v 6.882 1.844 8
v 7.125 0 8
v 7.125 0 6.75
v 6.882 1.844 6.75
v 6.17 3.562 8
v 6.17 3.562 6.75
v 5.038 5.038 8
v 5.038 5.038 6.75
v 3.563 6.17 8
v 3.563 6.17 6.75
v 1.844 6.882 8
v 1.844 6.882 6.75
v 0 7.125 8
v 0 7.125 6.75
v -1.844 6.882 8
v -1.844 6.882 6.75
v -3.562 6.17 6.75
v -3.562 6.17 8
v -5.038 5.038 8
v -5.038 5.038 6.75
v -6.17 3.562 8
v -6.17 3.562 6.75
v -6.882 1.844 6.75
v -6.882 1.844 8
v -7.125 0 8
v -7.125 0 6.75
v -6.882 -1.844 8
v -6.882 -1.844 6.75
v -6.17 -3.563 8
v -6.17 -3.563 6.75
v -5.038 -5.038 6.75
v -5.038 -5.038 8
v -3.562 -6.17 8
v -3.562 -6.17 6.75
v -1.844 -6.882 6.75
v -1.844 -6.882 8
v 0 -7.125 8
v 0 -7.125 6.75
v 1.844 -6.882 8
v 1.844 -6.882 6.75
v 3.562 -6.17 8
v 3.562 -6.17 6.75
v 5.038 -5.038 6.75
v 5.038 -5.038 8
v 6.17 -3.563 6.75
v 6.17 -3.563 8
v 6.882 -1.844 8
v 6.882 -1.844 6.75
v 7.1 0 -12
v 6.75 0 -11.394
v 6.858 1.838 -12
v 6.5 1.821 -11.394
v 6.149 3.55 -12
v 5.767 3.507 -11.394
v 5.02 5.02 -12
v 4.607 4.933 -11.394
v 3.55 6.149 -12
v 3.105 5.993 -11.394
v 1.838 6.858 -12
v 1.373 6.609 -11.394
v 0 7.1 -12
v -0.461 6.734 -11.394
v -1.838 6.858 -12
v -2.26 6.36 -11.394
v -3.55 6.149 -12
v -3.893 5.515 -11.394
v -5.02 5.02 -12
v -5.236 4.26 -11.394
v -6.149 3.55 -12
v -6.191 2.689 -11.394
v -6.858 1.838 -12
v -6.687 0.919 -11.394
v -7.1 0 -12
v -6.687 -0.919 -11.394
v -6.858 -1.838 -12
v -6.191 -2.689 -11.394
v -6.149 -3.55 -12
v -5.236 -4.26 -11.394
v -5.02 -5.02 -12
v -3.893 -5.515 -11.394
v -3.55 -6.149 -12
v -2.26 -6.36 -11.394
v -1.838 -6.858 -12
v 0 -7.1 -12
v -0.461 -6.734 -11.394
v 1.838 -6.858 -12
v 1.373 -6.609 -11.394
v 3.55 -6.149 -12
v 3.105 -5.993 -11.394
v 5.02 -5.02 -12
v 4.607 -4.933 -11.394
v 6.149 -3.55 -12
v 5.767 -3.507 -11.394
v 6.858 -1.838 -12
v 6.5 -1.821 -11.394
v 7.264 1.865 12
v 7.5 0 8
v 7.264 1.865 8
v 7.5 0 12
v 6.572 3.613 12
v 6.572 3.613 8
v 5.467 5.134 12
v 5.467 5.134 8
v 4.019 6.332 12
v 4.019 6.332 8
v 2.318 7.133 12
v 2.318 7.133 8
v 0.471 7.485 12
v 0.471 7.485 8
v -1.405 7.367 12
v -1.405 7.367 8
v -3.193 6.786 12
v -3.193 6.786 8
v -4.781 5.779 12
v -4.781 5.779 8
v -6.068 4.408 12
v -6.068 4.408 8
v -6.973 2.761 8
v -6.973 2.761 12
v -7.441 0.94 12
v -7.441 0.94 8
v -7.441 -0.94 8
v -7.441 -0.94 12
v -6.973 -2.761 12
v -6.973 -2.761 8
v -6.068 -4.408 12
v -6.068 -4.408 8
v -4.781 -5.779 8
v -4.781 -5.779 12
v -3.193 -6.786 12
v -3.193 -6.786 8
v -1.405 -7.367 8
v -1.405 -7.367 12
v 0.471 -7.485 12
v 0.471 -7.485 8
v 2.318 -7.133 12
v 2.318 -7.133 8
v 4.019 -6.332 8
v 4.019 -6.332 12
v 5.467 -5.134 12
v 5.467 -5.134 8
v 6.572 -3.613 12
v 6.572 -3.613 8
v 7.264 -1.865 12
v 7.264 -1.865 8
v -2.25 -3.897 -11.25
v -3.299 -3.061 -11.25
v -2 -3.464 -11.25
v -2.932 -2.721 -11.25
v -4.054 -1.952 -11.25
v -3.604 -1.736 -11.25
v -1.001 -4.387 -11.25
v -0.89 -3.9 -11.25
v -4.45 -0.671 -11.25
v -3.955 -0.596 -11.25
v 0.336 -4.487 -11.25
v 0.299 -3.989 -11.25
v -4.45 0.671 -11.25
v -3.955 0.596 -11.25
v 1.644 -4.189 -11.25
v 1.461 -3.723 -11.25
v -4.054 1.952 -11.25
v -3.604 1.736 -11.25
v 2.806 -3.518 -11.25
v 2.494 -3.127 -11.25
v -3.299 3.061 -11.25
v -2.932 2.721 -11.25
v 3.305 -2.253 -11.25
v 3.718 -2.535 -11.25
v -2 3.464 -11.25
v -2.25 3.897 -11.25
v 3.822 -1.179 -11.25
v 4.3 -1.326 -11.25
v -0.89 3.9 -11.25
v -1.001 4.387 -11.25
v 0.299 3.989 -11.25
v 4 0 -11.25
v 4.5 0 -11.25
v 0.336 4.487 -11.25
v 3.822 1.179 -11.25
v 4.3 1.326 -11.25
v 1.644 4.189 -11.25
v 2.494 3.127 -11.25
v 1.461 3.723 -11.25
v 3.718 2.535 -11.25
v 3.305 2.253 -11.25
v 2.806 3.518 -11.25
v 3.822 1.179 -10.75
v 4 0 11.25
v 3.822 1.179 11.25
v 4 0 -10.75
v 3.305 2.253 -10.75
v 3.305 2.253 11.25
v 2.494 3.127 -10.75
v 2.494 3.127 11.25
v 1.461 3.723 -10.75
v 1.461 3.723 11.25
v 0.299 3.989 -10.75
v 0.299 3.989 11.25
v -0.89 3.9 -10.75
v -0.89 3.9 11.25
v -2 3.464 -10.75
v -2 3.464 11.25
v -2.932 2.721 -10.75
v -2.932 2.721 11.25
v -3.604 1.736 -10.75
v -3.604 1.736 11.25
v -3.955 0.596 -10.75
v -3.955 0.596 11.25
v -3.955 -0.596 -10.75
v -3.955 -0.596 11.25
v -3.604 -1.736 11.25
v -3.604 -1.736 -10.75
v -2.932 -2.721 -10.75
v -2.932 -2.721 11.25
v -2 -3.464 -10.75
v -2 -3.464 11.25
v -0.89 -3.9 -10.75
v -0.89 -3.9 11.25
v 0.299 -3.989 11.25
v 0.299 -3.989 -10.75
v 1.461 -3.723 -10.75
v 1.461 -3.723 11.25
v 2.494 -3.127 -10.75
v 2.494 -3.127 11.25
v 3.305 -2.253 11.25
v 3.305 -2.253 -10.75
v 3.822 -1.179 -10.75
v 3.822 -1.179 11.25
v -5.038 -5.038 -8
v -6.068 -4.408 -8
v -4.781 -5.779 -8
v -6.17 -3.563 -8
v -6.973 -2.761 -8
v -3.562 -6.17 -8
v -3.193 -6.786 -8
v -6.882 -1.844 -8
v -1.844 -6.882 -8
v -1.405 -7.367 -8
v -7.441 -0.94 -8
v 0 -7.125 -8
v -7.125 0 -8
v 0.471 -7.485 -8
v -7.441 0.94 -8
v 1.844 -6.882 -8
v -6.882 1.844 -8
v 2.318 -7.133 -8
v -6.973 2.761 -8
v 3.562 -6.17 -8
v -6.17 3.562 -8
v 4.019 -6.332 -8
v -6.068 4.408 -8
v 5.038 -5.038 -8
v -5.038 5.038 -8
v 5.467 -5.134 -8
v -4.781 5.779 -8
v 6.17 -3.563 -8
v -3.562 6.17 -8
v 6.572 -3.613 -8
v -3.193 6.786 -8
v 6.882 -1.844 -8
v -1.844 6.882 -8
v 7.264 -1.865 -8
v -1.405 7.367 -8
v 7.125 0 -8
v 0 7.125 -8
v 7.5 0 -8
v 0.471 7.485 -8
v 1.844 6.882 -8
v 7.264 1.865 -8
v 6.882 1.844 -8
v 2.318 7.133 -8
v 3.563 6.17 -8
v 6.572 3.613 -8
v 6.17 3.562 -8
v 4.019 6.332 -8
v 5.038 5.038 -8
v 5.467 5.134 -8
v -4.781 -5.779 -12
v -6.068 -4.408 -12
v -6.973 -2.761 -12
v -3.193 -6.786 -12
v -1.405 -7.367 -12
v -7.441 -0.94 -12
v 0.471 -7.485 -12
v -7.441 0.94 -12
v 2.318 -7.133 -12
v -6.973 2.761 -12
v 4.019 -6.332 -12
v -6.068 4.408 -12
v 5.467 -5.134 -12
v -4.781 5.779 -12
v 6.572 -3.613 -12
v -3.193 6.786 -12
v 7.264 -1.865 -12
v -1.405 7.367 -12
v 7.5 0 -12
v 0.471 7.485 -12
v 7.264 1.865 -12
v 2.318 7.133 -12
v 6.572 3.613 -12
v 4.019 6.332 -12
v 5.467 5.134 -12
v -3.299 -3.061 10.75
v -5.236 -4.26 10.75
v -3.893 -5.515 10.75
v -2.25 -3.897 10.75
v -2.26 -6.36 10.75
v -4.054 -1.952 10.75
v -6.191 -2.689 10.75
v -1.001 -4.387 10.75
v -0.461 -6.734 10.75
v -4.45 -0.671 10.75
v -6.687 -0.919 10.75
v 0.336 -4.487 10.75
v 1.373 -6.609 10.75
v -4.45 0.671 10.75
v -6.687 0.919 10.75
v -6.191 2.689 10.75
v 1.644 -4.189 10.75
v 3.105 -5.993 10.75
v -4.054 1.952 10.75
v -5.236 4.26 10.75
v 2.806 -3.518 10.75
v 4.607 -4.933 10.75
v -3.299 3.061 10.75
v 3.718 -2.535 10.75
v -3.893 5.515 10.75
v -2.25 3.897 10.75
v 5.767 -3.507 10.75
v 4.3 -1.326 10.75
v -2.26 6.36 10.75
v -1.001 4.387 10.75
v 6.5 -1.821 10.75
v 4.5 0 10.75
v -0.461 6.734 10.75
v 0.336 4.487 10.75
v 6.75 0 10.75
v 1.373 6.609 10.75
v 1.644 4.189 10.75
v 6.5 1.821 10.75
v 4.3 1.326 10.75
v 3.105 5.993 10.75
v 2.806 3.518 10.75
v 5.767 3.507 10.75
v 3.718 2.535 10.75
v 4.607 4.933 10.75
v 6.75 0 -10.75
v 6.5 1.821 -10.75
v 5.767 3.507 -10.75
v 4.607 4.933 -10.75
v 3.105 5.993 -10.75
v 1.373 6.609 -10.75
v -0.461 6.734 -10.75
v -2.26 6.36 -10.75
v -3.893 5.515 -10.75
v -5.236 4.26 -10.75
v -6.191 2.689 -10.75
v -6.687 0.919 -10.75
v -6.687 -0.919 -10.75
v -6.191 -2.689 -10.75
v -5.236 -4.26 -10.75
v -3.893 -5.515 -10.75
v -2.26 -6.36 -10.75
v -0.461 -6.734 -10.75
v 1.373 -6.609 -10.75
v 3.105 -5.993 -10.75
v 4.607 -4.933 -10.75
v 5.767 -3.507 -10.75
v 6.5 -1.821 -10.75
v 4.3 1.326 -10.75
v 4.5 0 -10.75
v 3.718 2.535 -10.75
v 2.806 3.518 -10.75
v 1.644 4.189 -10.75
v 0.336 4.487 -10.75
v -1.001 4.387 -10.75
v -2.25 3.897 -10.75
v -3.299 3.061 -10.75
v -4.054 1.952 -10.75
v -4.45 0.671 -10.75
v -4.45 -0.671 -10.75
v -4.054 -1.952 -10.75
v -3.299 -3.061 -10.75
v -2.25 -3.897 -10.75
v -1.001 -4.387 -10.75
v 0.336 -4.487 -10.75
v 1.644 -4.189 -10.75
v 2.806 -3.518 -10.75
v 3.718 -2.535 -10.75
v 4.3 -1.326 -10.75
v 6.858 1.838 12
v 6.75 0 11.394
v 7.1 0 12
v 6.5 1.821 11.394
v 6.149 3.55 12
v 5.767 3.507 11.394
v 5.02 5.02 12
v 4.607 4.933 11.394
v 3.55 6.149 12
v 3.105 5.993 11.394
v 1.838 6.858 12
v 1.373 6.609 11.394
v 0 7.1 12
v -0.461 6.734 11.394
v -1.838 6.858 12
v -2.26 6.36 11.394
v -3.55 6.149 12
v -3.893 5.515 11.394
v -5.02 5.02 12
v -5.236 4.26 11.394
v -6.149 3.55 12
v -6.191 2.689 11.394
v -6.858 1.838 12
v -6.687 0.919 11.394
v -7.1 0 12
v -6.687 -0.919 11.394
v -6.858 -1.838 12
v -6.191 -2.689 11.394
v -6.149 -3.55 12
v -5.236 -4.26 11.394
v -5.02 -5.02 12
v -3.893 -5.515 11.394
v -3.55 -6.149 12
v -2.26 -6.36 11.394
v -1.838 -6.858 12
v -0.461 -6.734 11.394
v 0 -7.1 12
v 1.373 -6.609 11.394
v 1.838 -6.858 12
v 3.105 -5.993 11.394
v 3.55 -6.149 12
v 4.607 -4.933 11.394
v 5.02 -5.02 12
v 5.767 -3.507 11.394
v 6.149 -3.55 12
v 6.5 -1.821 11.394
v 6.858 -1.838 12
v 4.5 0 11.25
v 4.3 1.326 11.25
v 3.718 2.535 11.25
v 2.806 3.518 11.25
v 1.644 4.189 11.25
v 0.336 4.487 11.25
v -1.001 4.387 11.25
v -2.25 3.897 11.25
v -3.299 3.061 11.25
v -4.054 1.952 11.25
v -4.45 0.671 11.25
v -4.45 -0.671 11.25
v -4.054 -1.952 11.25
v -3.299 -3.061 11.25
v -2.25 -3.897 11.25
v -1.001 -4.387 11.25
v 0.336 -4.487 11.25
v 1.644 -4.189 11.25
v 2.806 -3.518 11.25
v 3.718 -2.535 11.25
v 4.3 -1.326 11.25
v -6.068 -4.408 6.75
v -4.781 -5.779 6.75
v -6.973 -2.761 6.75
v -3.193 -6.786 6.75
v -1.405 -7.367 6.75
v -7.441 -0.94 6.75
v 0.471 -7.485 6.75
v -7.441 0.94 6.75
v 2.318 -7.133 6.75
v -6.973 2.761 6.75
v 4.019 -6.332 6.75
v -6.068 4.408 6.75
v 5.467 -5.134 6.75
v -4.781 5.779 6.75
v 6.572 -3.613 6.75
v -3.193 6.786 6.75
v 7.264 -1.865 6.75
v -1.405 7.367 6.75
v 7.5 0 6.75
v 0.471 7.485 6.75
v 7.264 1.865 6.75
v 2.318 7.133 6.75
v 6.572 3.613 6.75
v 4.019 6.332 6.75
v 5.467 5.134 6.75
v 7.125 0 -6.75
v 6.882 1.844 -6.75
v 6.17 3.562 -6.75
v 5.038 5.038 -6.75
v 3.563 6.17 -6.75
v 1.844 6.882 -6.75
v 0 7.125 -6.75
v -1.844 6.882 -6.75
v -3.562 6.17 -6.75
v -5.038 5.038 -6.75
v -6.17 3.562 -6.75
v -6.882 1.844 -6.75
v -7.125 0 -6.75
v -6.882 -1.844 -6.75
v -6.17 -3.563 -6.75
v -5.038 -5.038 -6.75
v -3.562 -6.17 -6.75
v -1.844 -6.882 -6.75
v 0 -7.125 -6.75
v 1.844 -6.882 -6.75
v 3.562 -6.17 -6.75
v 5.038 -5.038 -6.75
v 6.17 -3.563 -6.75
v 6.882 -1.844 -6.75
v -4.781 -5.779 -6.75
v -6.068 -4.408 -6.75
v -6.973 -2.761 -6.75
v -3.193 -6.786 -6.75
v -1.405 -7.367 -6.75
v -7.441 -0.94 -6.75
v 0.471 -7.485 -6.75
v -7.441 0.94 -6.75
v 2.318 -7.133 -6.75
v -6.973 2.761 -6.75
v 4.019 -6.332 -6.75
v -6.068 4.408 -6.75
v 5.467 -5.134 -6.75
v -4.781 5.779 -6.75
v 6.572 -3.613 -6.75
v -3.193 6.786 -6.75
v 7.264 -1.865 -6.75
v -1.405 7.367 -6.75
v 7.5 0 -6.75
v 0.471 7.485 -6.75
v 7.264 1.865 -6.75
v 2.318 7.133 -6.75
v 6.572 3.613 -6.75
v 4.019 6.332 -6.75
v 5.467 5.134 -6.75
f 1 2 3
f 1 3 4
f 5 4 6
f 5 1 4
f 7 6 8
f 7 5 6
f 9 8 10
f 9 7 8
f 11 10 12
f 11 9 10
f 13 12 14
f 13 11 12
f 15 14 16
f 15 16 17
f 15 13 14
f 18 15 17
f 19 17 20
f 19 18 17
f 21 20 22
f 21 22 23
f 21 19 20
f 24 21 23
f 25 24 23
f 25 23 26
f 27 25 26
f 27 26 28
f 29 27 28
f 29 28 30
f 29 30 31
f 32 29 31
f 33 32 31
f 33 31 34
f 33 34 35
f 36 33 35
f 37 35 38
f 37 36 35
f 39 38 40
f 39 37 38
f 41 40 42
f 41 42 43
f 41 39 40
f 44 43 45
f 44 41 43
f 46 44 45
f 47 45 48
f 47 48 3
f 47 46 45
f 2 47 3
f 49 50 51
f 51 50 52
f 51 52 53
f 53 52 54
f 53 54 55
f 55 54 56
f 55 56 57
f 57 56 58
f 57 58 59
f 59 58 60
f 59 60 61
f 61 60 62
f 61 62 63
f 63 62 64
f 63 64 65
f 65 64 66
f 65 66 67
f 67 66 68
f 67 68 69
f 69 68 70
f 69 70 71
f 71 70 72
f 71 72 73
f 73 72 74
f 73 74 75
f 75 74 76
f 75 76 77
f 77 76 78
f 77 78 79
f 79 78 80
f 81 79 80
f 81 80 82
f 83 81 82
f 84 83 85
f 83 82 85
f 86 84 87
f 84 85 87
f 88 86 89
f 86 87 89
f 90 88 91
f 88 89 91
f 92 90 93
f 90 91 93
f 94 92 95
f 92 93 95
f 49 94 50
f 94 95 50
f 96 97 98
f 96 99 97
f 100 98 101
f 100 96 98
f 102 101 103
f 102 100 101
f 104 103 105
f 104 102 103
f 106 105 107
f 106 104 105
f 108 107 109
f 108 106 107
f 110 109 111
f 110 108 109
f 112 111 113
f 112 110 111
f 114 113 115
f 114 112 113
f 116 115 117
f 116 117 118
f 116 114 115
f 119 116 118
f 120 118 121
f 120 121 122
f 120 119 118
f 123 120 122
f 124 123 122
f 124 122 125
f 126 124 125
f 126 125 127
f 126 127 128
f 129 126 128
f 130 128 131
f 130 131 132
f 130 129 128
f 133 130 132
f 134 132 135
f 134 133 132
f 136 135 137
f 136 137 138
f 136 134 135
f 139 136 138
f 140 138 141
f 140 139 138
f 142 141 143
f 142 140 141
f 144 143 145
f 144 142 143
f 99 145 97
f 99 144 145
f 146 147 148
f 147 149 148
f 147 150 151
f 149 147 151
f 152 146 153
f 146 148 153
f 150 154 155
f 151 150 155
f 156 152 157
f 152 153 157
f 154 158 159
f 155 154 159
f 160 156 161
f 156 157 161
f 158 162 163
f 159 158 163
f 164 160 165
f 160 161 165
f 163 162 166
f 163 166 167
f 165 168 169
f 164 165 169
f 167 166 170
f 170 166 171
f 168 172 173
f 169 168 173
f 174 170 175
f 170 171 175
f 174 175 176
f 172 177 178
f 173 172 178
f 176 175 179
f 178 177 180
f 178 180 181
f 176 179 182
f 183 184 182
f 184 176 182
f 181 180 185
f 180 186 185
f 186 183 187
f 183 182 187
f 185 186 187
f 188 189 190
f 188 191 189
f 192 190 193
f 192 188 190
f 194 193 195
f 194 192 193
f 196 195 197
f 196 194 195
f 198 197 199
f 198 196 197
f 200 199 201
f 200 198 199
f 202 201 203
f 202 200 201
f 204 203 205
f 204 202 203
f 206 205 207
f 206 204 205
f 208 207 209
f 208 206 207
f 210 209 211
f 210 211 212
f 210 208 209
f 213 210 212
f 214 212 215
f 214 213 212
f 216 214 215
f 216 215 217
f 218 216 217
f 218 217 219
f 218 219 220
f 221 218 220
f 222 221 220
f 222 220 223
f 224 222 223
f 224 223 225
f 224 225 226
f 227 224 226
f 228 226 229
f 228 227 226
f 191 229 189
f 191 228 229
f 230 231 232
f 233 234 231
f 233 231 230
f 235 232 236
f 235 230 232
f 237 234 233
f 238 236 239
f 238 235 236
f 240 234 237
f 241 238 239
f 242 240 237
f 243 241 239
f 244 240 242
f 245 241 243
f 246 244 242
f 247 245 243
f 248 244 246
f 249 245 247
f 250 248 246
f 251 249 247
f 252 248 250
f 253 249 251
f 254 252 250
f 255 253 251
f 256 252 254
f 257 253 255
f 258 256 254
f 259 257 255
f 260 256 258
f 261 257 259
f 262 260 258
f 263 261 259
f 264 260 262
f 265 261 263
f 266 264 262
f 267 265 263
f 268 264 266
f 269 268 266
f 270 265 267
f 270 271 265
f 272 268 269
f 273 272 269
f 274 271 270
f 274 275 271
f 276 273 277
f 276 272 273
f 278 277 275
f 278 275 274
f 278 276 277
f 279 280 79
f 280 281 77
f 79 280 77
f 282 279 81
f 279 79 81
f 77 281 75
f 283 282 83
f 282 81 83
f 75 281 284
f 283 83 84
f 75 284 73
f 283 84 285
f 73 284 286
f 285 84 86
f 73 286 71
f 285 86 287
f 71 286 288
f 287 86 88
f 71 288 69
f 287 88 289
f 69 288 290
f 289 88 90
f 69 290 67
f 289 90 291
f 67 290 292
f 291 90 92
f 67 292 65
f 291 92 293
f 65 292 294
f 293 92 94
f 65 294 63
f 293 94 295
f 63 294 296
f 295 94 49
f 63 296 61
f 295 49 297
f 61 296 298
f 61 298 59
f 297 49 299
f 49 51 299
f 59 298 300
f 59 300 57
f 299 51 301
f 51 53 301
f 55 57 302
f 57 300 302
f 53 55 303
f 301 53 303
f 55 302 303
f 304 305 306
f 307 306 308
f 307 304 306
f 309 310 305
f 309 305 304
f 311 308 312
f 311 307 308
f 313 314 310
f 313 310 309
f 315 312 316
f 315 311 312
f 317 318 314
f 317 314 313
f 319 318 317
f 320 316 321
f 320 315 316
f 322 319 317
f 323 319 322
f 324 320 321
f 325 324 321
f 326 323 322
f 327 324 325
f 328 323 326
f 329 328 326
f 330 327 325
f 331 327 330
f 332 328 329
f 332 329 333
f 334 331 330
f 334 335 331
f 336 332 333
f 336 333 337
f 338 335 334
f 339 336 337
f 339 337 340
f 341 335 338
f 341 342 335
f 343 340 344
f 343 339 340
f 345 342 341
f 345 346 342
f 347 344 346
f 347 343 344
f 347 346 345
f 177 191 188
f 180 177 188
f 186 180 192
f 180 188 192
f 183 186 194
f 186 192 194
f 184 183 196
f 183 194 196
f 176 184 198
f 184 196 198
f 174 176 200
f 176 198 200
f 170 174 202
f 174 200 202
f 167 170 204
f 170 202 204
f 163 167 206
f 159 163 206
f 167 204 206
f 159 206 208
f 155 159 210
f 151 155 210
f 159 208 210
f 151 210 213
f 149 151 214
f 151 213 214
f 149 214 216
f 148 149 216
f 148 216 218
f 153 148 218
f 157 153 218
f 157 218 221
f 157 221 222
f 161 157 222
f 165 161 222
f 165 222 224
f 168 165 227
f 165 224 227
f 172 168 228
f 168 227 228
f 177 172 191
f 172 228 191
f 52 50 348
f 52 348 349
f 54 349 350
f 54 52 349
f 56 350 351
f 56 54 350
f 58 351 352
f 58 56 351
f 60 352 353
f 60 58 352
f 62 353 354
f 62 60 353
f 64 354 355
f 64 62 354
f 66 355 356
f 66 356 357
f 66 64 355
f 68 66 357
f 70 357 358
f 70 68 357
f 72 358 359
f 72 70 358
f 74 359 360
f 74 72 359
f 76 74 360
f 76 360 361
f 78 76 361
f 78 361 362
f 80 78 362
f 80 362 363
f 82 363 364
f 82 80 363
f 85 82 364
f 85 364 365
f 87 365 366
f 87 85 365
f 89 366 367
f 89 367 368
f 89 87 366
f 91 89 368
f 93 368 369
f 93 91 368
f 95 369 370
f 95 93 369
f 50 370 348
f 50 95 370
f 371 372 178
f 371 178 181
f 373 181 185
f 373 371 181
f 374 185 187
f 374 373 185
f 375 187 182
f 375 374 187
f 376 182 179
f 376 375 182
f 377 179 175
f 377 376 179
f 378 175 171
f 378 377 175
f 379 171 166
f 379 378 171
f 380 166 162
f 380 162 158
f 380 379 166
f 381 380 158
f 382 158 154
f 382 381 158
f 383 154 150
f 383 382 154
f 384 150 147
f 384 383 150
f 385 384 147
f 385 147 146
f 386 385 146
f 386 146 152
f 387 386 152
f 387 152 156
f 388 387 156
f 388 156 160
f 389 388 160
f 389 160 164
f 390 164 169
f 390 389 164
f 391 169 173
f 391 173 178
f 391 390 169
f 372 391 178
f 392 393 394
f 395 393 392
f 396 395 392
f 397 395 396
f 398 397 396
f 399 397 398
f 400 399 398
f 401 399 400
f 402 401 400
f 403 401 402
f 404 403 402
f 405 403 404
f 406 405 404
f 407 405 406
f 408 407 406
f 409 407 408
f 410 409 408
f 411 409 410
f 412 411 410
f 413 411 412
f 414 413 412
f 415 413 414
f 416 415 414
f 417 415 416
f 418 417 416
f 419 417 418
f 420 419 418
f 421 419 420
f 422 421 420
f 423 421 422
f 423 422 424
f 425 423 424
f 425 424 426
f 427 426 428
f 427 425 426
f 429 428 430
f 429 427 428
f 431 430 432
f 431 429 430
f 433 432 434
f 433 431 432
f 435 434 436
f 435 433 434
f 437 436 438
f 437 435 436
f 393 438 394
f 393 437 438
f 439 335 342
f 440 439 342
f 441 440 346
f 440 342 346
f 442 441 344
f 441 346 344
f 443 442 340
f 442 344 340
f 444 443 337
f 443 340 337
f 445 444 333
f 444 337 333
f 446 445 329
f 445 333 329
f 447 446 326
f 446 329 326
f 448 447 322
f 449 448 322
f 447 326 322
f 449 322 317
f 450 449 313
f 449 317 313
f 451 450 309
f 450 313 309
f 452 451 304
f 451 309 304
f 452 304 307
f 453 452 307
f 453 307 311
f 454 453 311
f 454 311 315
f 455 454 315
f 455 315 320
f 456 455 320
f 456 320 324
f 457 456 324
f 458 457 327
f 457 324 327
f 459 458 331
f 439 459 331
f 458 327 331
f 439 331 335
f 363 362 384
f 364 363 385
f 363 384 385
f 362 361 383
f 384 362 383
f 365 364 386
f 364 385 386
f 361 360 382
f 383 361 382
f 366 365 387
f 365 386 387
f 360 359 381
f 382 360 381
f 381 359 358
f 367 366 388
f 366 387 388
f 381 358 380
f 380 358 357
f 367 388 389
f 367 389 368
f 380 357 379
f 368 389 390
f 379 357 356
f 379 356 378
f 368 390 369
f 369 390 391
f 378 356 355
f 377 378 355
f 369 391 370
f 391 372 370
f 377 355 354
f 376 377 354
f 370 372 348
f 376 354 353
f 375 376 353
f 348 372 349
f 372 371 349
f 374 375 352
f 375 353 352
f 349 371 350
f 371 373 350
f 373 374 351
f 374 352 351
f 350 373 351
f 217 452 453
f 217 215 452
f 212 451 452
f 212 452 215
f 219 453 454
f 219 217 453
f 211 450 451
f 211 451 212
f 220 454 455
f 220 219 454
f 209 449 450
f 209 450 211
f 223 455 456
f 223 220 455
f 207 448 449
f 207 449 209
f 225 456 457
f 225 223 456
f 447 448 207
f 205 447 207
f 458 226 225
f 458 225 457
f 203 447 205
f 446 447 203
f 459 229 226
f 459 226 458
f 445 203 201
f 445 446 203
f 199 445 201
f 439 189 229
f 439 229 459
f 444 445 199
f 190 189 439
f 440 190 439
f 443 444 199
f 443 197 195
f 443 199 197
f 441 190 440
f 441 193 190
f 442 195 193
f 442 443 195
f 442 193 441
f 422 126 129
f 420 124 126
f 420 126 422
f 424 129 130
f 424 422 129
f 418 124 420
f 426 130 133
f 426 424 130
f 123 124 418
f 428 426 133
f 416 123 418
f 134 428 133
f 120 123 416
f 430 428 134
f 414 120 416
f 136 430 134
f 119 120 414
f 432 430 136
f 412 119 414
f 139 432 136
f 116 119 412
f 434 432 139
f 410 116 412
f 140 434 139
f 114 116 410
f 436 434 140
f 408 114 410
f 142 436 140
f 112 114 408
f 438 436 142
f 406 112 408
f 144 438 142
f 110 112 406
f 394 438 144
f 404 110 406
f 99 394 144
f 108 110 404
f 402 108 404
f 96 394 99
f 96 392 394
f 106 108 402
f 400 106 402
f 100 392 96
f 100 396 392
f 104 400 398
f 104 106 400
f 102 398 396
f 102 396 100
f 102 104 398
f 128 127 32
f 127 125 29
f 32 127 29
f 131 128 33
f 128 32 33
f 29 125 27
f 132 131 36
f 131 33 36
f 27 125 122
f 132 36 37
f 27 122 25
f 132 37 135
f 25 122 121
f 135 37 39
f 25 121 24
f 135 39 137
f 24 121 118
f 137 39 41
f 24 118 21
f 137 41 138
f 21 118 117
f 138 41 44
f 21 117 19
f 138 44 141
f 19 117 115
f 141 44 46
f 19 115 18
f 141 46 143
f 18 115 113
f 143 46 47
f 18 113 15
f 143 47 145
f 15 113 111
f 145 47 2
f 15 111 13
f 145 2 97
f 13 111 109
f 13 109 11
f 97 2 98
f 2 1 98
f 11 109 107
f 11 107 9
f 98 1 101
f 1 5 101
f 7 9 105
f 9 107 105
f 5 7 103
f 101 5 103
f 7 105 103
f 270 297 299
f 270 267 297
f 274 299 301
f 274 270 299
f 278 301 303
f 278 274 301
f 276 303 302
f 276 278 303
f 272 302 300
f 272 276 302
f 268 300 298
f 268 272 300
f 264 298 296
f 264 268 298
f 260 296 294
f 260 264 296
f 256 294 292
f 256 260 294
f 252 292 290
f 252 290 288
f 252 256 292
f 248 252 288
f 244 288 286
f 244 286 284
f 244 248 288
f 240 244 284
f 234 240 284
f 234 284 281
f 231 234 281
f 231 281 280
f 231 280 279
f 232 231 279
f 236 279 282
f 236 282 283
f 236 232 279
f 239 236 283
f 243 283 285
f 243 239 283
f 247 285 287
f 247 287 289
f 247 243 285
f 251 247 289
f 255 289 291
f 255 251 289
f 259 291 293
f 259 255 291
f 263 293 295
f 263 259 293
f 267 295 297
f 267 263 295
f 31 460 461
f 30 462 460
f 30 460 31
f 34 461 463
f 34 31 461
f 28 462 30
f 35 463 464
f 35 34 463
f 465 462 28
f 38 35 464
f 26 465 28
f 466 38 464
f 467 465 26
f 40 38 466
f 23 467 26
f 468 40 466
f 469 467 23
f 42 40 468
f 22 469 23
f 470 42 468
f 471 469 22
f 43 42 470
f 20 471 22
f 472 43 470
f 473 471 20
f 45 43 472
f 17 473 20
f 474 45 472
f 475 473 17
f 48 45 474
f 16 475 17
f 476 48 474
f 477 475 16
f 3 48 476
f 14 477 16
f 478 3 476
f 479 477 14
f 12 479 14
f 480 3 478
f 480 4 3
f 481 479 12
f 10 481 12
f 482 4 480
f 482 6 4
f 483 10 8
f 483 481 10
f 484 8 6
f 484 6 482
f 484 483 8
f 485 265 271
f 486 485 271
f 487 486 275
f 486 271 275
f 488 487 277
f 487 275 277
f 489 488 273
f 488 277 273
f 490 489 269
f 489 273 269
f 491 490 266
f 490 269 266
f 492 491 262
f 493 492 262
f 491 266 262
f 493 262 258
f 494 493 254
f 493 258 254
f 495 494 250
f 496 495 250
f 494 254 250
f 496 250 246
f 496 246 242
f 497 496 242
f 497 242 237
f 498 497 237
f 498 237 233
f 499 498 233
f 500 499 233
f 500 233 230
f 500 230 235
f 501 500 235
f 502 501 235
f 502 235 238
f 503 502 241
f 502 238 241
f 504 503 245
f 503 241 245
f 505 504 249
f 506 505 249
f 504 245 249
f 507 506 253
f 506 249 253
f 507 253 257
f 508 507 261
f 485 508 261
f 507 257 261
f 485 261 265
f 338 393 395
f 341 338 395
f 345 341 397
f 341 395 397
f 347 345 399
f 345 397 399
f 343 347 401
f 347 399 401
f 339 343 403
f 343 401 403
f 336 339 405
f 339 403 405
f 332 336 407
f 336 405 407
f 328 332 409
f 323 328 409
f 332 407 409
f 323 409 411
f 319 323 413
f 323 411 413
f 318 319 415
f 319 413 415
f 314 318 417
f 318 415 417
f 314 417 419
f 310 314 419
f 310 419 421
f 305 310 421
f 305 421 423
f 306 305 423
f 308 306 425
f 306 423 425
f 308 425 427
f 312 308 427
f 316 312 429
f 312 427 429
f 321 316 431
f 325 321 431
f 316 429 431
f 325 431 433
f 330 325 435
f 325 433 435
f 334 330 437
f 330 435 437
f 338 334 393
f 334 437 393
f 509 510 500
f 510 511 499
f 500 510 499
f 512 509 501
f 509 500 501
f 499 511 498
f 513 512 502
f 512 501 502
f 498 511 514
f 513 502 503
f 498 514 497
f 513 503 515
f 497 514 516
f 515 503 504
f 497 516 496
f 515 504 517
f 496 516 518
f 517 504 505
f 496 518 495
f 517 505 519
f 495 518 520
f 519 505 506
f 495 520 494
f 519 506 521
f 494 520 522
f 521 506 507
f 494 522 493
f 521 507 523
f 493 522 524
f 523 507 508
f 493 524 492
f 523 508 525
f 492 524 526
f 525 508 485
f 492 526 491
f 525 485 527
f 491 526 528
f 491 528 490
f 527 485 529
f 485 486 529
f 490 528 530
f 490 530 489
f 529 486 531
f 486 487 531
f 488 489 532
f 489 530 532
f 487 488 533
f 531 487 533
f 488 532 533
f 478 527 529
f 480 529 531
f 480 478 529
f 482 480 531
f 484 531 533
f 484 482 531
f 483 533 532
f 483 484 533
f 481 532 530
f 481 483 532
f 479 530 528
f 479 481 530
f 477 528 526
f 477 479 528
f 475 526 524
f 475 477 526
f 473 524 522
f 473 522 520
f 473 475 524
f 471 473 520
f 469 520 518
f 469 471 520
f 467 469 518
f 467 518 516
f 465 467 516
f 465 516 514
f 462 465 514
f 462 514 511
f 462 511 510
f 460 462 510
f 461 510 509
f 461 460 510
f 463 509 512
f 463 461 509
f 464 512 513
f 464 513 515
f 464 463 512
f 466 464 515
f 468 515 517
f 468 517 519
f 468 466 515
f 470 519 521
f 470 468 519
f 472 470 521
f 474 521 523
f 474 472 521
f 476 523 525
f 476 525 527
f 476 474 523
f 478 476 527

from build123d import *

# Parameters (mm, degrees)
SZKIC1_R                    = 7.5
SZKIC1_R_2                  = 4
DODANIE_WYCI_GNI_CIE1_DEPTH = 12
SZKIC2_R                    = 6.75
WYTNIJ_WYCI_GNI_CIE1_DEPTH  = 1.25
SZKIC3_R                    = 4.5
SZKIC3_R_2                  = 4
DODANIE_WYCI_GNI_CIE2_DEPTH = 0.5
SFAZOWANIE1_SIZE            = 0.35
SFAZOWANIE1_SIZE2           = 0.606217783
SZKIC4_R                    = 7.5
SZKIC4_R_2                  = 7.125
WYTNIJ_WYCI_GNI_CIE2_DEPTH  = 1.25
SFAZOWANIE2_SIZE            = 0.35
SFAZOWANIE2_SIZE2           = 0.606217783


with BuildPart() as part:
    # Szkic1 → Dodanie-wyciągnięcie1 (new, symmetric)
    with BuildSketch(Plane.XY):
        Circle(SZKIC1_R)
        Circle(SZKIC1_R_2, mode=Mode.SUBTRACT)
    extrude(amount=DODANIE_WYCI_GNI_CIE1_DEPTH, both=True)

    # Szkic2 → Wytnij-wyciągnięcie1 (cut)
    with BuildSketch(Plane.XY.offset(12)):
        Circle(SZKIC2_R)
    wytnij_wyci_gni_cie1 = extrude(amount=-WYTNIJ_WYCI_GNI_CIE1_DEPTH, mode=Mode.SUBTRACT)

    # Szkic3 → Dodanie-wyciągnięcie2 (add)
    with BuildSketch(Plane.XY.offset(10.75)):
        Circle(SZKIC3_R)
        Circle(SZKIC3_R_2, mode=Mode.SUBTRACT)
    dodanie_wyci_gni_cie2 = extrude(amount=DODANIE_WYCI_GNI_CIE2_DEPTH)

    # Sfazowanie1
    sfazowanie1_edges = [part.edges().sort_by_distance(p)[0] for p in [
        (-6.75, 0, 12),
    ]]
    sfazowanie1_side = [part.faces().sort_by_distance(p)[0] for p in [
        (-7.287867966, 0, 12),
    ]]
    chamfer(sfazowanie1_edges, length=SFAZOWANIE1_SIZE, length2=SFAZOWANIE1_SIZE2, reference=sfazowanie1_side[0])

    # Szkic4 → Wytnij-wyciągnięcie2 (cut)
    with BuildSketch(Plane.XY.offset(8)):
        Circle(SZKIC4_R)
        Circle(SZKIC4_R_2, mode=Mode.SUBTRACT)
    wytnij_wyci_gni_cie2 = extrude(amount=-WYTNIJ_WYCI_GNI_CIE2_DEPTH, mode=Mode.SUBTRACT)

    # Lustro4: Wytnij-wyciągnięcie1, Dodanie-wyciągnięcie2, Wytnij-wyciągnięcie2 across plane
    add(wytnij_wyci_gni_cie1.mirror(Plane.XY), mode=Mode.SUBTRACT)
    add(dodanie_wyci_gni_cie2.mirror(Plane.XY))
    add(wytnij_wyci_gni_cie2.mirror(Plane.XY), mode=Mode.SUBTRACT)

    # Sfazowanie2
    sfazowanie2_edges = [part.edges().sort_by_distance(p)[0] for p in [
        (-6.75, 0, -12),
    ]]
    sfazowanie2_side = [part.faces().sort_by_distance(p)[0] for p in [
        (-7.287867966, 0, -12),
    ]]
    chamfer(sfazowanie2_edges, length=SFAZOWANIE2_SIZE, length2=SFAZOWANIE2_SIZE2, reference=sfazowanie2_side[0])


solid = part.part
